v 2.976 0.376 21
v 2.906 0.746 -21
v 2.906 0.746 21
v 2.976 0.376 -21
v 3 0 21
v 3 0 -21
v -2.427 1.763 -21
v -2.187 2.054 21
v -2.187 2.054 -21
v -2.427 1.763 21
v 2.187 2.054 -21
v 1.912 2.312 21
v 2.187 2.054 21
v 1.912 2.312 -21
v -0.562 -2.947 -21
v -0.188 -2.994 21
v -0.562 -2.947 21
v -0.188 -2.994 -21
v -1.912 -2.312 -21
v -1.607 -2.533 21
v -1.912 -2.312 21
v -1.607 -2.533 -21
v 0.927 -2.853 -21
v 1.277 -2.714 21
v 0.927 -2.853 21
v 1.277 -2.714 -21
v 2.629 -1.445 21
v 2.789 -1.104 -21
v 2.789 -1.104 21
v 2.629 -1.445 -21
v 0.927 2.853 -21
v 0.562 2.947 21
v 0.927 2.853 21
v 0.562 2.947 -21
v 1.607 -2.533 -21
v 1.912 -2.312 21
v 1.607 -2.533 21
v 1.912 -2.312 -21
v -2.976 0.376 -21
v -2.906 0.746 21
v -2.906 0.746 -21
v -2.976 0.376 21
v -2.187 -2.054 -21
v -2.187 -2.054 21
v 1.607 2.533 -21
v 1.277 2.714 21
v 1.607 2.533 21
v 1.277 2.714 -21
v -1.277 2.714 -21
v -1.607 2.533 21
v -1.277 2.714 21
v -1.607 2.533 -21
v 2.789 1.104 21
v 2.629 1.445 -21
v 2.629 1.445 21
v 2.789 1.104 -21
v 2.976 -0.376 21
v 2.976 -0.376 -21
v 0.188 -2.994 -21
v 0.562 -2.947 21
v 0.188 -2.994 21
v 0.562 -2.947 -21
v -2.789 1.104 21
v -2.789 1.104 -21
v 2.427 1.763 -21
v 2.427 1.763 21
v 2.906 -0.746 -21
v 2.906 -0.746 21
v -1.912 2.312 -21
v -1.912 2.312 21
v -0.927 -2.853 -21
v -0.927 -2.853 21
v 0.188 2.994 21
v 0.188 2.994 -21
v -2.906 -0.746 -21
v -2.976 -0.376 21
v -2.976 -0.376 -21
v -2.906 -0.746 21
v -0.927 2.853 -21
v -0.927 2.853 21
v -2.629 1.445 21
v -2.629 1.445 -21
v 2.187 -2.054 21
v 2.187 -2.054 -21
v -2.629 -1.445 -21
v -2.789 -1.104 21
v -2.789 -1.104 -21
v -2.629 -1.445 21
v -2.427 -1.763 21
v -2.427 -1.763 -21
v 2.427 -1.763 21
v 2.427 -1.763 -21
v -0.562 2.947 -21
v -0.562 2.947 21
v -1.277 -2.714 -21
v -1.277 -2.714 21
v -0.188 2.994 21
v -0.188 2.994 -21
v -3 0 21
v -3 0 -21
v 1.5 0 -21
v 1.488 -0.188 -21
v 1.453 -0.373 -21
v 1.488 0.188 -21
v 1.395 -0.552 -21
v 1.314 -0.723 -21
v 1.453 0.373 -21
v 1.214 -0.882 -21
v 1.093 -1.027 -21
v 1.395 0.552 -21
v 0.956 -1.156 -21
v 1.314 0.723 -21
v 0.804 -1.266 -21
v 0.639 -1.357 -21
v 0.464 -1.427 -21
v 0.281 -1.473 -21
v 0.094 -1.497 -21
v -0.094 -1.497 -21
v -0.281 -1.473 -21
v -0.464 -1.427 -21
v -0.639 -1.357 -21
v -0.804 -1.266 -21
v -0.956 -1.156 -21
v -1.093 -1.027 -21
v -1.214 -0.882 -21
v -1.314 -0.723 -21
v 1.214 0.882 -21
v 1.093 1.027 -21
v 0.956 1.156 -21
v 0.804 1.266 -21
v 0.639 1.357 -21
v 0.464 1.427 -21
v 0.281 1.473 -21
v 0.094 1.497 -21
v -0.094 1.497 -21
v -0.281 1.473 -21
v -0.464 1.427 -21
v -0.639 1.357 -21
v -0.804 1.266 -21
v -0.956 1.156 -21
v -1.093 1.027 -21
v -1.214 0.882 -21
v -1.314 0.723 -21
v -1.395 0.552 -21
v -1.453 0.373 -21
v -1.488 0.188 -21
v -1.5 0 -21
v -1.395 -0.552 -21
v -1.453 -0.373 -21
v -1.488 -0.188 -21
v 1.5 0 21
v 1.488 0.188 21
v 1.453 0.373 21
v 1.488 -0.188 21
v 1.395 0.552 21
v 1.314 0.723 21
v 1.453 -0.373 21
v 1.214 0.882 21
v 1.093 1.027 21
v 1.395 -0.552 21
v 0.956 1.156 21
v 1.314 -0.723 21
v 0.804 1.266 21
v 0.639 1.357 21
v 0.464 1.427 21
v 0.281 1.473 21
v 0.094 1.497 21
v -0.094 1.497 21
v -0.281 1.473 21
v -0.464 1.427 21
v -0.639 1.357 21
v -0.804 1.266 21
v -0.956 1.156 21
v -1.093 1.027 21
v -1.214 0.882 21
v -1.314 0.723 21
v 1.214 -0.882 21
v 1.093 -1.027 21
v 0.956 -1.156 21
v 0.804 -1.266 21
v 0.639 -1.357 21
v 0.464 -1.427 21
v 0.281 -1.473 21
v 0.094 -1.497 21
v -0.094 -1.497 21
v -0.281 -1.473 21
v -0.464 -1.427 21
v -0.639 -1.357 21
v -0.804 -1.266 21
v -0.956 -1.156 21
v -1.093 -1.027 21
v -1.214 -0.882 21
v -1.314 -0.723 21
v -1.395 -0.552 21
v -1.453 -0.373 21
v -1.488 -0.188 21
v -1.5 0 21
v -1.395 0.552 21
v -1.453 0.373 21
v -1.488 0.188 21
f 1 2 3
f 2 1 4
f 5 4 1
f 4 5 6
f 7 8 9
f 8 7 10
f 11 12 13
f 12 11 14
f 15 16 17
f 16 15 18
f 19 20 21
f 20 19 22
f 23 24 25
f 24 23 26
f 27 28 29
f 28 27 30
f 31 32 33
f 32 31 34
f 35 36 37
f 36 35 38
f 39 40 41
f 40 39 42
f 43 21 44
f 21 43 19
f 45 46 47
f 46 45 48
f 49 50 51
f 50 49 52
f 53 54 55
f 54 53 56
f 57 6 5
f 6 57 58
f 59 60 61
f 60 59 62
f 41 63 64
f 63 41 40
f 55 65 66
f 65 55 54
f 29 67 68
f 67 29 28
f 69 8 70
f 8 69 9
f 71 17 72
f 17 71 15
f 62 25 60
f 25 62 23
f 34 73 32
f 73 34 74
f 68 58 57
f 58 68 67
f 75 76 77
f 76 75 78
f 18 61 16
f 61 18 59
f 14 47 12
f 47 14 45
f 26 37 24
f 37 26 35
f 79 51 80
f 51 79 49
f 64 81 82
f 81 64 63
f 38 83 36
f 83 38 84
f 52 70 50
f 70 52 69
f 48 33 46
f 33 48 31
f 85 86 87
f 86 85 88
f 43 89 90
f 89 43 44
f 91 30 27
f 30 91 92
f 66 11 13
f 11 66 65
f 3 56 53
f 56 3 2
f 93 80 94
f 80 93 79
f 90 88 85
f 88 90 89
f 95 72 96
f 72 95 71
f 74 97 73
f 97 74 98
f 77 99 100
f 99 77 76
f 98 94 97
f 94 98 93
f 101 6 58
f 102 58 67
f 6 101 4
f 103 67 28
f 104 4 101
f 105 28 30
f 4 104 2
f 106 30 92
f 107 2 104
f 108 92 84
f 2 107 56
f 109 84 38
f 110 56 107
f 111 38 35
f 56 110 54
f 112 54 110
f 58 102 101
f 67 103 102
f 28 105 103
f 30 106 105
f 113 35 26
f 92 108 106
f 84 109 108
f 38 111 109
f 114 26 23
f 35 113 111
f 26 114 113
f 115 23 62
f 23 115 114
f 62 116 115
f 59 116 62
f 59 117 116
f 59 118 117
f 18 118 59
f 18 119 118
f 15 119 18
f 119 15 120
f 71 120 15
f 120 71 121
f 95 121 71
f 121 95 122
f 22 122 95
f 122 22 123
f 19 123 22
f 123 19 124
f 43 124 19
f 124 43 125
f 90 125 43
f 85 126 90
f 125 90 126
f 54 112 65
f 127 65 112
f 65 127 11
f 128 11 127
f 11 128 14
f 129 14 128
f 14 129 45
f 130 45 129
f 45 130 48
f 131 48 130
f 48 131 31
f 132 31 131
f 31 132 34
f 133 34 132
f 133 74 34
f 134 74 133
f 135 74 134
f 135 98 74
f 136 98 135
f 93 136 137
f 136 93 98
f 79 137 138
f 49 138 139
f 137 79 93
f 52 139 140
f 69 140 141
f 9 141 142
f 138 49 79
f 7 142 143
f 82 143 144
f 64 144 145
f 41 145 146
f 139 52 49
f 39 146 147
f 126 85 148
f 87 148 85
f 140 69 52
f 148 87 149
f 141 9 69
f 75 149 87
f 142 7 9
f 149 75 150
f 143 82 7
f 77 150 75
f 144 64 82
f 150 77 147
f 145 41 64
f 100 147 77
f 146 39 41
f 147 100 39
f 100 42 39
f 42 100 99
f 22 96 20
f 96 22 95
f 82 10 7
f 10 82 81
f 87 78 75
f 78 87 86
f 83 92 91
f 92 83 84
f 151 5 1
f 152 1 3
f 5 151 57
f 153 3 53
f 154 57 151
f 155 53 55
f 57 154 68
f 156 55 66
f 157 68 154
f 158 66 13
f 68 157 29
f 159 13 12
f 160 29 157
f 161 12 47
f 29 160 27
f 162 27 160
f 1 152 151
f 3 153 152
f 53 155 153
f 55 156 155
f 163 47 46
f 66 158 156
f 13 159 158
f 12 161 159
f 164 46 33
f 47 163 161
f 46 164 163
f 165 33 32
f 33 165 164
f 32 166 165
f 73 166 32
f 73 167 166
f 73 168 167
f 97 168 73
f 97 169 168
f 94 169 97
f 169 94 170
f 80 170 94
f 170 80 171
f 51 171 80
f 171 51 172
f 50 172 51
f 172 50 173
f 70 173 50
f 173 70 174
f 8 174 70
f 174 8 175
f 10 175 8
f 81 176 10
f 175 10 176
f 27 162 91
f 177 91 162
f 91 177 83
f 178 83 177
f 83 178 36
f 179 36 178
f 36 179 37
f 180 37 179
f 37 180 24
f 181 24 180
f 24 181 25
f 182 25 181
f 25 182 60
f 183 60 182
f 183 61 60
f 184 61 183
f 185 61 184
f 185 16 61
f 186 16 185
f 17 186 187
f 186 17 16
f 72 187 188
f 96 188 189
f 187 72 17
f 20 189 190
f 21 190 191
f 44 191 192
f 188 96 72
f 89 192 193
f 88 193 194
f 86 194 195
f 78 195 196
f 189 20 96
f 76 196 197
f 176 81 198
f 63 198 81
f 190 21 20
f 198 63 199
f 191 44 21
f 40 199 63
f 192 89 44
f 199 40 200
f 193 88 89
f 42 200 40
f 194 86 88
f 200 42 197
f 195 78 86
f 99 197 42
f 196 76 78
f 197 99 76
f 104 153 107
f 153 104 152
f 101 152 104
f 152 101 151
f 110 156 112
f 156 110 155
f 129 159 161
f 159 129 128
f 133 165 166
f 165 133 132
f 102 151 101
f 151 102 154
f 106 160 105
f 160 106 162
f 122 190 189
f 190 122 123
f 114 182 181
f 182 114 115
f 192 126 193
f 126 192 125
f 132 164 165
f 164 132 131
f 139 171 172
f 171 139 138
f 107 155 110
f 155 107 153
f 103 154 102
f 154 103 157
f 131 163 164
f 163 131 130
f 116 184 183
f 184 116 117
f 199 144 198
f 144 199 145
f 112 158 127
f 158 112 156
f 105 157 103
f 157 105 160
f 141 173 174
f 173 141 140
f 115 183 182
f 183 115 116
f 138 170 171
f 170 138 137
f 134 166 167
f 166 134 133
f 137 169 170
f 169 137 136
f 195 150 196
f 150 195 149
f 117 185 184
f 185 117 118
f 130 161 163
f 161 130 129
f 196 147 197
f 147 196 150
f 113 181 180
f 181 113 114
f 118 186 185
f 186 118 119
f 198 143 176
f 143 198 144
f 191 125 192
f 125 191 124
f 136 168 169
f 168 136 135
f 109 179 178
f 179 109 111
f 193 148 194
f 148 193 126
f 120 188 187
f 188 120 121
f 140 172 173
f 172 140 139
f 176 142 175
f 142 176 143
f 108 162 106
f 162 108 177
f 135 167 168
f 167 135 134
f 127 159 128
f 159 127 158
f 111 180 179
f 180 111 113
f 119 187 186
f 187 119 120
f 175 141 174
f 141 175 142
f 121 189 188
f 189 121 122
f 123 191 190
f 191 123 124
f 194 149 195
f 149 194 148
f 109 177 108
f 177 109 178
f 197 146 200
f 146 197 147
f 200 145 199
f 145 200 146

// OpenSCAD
$fn = 50;


difference() {
	union() {
		translate(v = [0, 0, -21.0000000000]) {
			cylinder(h = 42, r = 3.0000000000);
		}
	}
	union() {
		translate(v = [0, 0, -100.0000000000]) {
			cylinder(h = 200, r = 1.5000000000);
		}
	}
}
